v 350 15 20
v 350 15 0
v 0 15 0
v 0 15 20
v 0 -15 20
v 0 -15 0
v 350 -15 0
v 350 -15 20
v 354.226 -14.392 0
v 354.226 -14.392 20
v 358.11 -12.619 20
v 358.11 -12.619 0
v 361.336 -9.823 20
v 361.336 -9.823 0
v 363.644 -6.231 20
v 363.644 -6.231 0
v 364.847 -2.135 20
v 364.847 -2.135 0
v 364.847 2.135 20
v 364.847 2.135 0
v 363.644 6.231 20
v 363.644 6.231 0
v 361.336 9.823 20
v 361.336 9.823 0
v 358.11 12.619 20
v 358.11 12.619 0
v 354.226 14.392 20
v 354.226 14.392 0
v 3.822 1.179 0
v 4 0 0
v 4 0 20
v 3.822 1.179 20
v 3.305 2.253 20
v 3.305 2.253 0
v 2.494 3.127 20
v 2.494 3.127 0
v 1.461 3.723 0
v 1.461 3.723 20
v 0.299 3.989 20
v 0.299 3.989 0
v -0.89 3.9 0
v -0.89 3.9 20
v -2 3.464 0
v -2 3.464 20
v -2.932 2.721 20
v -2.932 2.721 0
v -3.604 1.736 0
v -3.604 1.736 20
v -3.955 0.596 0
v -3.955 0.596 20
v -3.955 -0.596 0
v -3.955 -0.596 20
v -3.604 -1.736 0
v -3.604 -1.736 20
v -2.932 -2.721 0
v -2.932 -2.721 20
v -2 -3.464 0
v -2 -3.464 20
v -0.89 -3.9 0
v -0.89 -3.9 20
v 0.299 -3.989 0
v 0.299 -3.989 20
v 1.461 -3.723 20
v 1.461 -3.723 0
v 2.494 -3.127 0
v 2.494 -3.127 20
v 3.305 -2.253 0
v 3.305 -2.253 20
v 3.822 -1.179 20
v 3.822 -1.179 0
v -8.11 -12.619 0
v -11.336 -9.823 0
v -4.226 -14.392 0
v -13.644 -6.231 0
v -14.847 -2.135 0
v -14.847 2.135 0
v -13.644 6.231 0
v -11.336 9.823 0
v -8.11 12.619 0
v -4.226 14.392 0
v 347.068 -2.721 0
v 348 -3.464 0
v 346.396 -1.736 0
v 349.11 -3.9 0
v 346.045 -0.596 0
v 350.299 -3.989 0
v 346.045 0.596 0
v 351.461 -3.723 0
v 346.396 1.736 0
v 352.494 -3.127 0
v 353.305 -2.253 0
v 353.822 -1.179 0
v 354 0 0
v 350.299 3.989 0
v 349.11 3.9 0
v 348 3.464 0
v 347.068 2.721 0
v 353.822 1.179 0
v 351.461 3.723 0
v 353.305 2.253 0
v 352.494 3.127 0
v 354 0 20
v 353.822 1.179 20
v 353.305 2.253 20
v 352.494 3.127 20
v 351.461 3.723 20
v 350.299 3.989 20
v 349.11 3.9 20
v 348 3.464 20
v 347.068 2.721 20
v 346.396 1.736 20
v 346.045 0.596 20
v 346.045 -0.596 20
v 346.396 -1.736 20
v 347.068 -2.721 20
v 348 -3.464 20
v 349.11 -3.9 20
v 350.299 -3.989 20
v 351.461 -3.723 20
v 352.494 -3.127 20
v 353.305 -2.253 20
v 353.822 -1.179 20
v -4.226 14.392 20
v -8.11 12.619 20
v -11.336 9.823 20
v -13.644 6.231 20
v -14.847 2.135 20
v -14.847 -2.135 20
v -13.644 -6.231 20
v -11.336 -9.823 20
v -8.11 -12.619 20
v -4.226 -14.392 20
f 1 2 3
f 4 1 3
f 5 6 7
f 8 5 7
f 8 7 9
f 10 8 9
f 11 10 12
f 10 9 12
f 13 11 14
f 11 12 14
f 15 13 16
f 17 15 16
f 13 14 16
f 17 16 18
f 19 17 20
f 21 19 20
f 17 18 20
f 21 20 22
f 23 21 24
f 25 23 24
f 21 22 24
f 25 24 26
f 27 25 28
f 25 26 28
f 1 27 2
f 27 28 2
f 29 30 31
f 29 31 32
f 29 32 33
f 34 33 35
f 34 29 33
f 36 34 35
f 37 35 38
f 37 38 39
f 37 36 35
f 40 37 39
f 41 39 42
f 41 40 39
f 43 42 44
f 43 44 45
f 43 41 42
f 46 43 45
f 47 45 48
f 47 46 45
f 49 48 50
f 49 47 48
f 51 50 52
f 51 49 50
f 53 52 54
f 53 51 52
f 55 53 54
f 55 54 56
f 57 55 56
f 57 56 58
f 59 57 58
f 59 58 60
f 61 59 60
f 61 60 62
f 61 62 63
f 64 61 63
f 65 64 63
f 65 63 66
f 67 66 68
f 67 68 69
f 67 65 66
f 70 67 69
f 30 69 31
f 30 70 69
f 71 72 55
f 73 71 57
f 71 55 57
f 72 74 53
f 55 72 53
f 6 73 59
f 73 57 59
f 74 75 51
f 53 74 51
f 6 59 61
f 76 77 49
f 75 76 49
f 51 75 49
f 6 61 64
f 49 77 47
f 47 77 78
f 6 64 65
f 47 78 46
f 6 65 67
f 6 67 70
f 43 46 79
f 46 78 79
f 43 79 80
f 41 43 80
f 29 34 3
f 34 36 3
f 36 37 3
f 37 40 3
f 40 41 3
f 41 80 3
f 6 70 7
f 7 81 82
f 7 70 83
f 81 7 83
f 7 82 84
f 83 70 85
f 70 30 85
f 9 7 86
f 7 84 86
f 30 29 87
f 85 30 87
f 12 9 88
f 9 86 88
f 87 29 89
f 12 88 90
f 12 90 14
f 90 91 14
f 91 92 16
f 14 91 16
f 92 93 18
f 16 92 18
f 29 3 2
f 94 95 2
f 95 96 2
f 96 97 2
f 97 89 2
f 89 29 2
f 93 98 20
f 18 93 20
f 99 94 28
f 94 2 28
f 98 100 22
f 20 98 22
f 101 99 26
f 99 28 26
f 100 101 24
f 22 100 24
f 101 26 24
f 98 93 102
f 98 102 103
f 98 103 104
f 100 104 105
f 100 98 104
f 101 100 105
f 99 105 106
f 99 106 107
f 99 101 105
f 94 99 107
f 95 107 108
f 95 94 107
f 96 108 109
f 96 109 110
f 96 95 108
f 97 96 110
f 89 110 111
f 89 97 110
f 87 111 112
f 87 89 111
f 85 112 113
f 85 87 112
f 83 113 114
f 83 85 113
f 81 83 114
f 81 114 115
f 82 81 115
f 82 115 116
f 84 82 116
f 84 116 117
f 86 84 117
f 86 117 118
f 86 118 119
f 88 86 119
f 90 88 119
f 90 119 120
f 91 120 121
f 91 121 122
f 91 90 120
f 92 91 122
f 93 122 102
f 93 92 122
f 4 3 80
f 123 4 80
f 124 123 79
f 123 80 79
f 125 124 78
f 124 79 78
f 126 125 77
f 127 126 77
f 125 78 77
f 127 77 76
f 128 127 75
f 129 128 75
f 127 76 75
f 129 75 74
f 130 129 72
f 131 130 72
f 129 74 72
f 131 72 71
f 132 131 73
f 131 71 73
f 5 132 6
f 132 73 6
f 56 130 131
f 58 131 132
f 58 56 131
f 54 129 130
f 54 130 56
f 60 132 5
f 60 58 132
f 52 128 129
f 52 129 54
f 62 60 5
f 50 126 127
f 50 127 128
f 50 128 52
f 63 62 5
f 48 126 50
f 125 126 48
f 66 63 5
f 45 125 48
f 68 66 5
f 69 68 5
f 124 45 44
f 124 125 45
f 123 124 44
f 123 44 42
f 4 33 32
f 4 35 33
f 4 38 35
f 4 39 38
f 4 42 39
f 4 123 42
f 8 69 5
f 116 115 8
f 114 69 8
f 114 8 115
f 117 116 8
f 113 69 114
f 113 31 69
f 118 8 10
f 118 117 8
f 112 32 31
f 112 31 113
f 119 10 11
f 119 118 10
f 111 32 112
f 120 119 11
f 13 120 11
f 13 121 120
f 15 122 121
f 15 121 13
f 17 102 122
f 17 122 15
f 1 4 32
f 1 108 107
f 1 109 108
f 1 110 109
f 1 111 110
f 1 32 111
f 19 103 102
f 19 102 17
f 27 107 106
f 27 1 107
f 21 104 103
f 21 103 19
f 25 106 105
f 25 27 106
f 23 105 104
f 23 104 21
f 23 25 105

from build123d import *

# Parameters (mm, degrees)
EXTRUDE_1_DEPTH     = 20
SKETCH_2_R          = 4
CUT_EXTRUDE_1_DEPTH = 20


with BuildPart() as part:
    # 草图1 → 凸台-拉伸1 (new body)
    with BuildSketch(Plane.XY):
        with BuildLine():
            Line((0, -15), (350, -15))
            ThreePointArc((350, -15), (365, 0), (350, 15))
            Line((350, 15), (0, 15))
            ThreePointArc((0, 15), (-15, 0), (0, -15))
        make_face()
    extrude(amount=EXTRUDE_1_DEPTH)

    # 草图2 → 切除-拉伸1 (cut)
    with BuildSketch(Plane.XY):
        Circle(SKETCH_2_R)
        with Locations((350, 0)):
            Circle(SKETCH_2_R)
    extrude(amount=CUT_EXTRUDE_1_DEPTH, mode=Mode.SUBTRACT)


solid = part.part
